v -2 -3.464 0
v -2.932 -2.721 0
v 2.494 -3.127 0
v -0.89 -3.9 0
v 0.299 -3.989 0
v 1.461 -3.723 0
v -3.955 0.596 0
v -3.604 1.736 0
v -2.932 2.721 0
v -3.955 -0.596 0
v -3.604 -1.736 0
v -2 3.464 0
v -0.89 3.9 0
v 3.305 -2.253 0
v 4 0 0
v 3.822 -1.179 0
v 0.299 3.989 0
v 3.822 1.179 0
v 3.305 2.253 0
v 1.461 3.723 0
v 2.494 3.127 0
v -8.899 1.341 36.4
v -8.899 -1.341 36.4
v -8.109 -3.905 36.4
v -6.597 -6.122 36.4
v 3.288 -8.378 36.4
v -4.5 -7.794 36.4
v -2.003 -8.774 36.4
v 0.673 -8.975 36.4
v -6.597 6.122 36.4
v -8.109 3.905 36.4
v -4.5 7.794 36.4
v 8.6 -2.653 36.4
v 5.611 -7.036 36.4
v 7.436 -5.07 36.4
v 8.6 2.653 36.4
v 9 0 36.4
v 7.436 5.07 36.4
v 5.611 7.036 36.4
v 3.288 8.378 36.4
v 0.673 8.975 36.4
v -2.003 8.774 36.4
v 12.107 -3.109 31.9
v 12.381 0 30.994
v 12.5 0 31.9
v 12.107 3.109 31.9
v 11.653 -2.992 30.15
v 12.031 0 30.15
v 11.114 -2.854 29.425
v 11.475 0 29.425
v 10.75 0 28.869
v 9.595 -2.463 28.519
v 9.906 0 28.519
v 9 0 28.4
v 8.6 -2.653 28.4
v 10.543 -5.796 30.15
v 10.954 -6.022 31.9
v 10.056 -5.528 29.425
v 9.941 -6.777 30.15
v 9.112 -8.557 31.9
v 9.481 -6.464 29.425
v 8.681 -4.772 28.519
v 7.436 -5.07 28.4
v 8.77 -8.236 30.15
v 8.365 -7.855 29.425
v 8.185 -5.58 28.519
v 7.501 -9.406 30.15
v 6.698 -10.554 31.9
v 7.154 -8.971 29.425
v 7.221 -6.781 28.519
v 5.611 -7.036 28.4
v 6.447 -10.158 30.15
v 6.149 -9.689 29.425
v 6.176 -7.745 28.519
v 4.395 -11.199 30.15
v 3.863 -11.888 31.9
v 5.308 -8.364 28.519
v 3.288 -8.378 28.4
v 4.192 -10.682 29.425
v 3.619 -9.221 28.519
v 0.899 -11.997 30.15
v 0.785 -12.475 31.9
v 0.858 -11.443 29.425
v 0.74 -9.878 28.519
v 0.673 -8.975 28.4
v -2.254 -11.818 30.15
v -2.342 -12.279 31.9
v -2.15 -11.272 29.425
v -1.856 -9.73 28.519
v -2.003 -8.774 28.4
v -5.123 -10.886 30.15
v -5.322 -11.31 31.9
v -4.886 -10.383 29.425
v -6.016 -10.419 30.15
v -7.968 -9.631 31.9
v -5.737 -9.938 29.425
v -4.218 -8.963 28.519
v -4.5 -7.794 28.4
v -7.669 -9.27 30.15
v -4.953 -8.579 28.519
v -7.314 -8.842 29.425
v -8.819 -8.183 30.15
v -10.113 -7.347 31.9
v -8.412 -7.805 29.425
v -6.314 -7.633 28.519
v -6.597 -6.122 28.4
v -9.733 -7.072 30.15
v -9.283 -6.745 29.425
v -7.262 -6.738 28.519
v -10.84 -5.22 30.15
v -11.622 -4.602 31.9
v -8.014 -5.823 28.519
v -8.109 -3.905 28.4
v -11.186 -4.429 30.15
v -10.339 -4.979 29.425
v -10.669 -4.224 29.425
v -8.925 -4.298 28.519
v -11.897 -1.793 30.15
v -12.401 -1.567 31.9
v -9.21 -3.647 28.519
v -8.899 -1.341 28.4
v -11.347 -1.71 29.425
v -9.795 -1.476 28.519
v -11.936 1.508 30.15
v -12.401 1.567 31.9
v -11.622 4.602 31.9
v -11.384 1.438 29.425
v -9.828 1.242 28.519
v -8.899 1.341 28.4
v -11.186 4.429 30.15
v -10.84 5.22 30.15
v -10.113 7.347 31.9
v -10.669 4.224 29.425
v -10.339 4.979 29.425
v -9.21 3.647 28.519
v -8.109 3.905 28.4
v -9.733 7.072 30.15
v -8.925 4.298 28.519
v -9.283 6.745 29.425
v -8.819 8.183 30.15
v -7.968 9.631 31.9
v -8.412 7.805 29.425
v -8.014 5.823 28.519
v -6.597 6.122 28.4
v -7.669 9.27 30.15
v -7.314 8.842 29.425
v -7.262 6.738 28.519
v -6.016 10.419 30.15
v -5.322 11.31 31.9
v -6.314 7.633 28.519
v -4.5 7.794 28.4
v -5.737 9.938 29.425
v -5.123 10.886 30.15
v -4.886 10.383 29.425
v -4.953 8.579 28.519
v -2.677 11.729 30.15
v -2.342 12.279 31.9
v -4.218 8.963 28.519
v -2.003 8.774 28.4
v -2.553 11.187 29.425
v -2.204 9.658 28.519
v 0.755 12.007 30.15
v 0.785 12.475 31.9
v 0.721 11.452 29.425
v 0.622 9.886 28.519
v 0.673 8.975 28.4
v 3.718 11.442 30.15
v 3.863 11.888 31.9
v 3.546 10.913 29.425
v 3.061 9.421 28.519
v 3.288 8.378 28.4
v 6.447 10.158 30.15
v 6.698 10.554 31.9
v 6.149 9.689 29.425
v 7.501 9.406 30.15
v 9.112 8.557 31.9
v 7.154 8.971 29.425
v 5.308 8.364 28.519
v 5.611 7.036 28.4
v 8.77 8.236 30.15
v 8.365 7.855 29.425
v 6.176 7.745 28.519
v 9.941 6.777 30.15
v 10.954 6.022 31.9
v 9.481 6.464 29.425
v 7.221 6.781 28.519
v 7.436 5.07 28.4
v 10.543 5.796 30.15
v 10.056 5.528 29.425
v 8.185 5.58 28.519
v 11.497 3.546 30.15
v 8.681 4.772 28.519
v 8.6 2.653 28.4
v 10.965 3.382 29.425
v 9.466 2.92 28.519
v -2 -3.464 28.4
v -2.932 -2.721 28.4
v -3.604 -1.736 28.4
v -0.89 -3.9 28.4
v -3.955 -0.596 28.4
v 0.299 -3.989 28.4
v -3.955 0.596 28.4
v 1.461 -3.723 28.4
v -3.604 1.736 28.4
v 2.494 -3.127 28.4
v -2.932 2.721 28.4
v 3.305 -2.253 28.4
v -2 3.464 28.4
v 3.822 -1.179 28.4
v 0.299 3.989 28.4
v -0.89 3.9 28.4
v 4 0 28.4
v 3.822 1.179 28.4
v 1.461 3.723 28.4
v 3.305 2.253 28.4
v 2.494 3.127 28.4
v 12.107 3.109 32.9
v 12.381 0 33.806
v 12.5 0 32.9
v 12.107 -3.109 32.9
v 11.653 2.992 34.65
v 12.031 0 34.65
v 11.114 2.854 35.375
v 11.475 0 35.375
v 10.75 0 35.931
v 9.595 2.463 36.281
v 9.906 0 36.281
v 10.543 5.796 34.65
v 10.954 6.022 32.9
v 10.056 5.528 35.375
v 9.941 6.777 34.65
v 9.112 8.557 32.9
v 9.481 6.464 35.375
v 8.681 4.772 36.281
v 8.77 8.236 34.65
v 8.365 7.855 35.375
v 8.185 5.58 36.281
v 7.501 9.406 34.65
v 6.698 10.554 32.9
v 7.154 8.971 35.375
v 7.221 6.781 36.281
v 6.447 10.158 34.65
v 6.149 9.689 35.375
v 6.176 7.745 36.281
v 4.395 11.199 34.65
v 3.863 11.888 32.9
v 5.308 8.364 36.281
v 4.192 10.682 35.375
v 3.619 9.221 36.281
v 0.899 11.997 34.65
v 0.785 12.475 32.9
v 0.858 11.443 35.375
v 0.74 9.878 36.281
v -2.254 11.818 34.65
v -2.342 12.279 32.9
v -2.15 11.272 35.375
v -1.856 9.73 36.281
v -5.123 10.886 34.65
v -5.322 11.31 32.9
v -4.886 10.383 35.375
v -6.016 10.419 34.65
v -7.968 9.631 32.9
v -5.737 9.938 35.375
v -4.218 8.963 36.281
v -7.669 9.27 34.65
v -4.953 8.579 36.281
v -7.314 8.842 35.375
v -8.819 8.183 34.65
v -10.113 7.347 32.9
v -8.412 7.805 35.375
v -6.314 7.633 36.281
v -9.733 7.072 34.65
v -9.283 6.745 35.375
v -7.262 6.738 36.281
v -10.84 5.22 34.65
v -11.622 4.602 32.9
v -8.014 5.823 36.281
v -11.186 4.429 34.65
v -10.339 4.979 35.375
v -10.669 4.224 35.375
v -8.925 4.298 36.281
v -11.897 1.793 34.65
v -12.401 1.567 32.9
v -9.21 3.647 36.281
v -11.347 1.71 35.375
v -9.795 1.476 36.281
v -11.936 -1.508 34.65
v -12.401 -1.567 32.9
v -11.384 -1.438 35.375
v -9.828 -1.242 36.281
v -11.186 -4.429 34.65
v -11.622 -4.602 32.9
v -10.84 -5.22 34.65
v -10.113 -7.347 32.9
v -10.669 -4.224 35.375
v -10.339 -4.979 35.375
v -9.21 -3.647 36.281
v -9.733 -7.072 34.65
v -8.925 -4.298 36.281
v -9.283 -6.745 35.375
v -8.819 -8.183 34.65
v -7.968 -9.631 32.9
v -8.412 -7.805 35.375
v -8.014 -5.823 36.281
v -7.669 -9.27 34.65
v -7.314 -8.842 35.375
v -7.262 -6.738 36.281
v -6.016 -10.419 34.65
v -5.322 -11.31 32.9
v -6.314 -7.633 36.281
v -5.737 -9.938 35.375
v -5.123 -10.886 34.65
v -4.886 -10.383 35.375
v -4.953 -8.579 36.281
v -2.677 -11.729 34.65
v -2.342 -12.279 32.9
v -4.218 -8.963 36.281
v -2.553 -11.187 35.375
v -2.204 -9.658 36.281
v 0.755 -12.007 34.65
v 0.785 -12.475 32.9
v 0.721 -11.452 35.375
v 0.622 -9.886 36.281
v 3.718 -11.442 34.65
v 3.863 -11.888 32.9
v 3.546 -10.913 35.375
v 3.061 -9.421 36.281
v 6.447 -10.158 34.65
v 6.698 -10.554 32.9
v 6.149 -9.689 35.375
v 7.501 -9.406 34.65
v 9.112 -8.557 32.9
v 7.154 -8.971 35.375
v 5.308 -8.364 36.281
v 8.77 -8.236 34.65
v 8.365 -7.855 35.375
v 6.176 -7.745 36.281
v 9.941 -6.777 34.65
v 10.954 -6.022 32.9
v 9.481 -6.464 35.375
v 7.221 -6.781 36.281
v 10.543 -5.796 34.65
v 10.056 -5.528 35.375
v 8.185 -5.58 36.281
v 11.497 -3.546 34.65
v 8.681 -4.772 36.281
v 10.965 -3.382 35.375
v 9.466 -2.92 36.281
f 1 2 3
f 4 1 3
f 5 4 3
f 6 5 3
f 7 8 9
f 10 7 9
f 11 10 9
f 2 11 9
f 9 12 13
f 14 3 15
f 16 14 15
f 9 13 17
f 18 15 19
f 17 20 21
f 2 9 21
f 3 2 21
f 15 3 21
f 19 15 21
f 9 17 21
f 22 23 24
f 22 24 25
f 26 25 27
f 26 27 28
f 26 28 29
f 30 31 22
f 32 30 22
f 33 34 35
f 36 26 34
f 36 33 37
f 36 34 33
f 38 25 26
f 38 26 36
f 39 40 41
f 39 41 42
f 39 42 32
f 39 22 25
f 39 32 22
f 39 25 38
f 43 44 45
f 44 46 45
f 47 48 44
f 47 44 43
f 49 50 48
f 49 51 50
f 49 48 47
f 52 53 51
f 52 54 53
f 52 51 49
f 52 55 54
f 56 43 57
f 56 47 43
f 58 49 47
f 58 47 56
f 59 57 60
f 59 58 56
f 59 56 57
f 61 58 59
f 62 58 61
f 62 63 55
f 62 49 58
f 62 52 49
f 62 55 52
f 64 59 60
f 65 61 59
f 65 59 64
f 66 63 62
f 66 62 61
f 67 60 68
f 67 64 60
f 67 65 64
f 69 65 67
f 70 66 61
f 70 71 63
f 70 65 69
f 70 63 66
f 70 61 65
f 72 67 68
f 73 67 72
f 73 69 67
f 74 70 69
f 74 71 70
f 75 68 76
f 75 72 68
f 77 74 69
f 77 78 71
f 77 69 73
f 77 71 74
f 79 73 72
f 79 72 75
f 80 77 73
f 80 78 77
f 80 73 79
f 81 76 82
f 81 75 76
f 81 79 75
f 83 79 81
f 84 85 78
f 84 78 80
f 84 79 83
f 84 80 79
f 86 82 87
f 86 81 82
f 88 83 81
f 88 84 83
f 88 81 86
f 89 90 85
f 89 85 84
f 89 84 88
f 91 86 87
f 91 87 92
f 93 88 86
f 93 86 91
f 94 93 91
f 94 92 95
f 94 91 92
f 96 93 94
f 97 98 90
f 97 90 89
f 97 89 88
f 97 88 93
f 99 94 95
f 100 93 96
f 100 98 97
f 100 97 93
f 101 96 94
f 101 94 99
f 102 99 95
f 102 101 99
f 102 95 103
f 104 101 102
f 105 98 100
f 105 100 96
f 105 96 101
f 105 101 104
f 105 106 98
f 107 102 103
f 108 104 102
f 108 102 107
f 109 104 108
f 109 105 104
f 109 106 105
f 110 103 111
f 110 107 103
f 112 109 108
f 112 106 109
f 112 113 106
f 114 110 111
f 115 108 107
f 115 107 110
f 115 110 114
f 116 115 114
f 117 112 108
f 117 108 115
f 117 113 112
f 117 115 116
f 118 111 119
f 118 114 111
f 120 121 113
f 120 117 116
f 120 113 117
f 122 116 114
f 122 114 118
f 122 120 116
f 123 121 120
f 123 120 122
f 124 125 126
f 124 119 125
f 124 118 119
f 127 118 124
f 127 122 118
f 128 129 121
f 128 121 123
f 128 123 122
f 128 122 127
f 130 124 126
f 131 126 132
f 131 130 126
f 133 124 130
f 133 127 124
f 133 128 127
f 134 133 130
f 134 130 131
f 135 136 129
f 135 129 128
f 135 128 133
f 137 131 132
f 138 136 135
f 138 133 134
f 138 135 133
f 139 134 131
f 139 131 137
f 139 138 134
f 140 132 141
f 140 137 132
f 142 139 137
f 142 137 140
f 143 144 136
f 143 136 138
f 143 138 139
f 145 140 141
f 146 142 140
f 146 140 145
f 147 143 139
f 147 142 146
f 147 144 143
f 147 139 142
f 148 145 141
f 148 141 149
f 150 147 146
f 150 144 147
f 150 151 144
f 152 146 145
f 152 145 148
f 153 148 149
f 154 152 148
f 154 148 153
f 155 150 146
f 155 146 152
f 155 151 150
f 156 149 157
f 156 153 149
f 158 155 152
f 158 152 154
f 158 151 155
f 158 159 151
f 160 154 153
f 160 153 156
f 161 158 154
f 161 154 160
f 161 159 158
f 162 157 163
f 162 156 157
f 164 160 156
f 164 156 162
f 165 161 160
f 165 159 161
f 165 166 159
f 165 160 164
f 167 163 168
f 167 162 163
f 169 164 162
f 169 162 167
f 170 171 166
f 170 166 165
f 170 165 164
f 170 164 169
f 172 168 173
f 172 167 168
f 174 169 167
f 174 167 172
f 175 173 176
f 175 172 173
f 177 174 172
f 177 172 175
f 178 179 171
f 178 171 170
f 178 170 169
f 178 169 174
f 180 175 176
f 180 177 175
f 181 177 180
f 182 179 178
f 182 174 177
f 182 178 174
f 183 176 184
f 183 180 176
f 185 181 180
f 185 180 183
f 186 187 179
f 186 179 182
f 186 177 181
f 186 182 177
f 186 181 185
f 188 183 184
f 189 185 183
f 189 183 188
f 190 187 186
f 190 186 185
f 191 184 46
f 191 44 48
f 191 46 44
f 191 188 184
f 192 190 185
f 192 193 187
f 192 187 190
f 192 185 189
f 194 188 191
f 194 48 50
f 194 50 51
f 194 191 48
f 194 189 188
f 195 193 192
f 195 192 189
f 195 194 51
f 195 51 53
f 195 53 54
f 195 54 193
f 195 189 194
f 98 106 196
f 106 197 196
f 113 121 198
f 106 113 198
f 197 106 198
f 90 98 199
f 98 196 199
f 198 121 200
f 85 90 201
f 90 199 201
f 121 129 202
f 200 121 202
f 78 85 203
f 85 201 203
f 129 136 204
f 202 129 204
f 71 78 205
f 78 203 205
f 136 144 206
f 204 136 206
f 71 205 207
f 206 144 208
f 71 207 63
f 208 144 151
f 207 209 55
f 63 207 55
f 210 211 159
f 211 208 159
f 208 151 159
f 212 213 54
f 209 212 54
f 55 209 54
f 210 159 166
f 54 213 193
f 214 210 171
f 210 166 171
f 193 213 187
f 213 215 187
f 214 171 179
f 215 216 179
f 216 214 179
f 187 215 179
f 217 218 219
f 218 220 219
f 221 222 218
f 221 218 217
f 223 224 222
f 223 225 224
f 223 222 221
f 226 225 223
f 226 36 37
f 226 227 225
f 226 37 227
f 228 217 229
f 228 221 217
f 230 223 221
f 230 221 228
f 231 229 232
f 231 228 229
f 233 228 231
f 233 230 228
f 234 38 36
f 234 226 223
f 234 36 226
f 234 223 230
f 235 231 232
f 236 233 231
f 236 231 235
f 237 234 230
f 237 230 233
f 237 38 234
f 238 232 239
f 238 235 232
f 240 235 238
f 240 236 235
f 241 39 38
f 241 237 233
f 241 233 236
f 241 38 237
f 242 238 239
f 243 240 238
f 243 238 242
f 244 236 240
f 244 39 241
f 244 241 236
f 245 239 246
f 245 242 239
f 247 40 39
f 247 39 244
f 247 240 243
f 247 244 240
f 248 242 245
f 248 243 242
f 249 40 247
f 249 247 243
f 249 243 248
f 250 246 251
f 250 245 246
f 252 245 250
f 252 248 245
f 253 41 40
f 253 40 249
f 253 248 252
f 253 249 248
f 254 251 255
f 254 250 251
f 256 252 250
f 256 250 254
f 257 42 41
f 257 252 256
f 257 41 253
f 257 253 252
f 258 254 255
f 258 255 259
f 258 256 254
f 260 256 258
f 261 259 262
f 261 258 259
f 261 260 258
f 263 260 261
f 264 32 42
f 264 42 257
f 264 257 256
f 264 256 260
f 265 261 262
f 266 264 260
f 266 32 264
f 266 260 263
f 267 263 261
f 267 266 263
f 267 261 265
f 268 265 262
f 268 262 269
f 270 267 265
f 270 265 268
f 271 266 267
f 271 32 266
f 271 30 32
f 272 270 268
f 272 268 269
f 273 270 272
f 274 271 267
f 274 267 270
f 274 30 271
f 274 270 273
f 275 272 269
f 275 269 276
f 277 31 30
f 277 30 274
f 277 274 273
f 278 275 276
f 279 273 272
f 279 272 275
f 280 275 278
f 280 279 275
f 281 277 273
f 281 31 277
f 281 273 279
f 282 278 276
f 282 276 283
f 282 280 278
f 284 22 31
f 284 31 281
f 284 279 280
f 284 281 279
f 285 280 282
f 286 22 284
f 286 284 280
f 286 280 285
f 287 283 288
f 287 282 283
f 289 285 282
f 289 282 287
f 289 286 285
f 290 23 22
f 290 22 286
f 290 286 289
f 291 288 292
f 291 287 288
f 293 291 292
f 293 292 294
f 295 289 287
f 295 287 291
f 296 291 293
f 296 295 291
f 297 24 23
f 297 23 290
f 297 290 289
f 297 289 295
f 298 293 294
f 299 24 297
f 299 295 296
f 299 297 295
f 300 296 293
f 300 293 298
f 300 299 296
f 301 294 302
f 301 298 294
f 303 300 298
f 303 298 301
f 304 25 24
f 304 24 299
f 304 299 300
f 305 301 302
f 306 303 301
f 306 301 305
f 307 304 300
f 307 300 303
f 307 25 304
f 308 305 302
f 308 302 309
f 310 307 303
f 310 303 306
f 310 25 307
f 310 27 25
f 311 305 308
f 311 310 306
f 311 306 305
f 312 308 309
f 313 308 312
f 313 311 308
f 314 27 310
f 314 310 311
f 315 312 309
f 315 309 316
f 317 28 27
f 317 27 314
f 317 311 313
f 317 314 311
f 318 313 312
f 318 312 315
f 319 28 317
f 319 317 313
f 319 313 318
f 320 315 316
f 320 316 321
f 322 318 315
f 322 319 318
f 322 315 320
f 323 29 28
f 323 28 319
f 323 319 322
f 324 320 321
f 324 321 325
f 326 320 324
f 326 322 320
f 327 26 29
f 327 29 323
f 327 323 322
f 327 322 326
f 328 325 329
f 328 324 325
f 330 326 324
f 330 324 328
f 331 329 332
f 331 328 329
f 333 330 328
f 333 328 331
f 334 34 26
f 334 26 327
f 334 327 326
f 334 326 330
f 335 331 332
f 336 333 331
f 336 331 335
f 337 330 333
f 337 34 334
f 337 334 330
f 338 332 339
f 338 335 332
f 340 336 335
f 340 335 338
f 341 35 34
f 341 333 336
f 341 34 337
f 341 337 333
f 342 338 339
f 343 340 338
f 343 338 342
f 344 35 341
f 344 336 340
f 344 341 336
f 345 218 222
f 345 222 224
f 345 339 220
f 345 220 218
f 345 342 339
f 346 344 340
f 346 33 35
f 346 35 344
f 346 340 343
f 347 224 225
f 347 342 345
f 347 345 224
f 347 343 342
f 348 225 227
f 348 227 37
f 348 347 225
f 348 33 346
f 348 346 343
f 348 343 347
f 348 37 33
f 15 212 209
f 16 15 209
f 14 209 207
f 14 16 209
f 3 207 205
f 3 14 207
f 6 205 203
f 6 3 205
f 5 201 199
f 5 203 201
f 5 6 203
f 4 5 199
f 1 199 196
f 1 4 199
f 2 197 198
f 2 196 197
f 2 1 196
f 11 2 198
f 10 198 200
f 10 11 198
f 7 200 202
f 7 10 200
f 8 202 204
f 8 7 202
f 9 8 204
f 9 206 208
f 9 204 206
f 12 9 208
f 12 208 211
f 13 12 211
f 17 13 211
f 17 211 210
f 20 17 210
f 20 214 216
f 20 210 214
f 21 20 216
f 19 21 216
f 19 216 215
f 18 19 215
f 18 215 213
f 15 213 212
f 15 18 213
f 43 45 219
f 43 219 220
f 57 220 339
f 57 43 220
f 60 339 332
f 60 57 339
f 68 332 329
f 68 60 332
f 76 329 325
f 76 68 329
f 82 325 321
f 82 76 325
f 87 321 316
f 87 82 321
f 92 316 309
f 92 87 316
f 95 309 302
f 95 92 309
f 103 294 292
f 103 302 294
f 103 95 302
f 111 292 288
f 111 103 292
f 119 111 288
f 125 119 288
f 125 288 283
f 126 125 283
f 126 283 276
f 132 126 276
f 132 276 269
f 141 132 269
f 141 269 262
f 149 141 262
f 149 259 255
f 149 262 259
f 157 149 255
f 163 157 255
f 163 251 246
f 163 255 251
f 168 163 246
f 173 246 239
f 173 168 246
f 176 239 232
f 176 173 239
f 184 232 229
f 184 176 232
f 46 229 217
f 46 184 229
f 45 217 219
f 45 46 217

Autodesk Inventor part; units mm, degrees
ref_plane "YZ Plane" through (0, 0, 0) normal (1, 0, 0) x (0, 1, 0)
ref_plane "XZ Plane" through (0, 0, 0) normal (0, 1, 0) x (-1, 0, 0)
ref_plane "XY Plane" through (0, 0, 0) normal (0, 0, 1) x (1, 0, 0)
sketch "Sketch1" plane through (0, 0, 0) normal (0, 0, 1) x (1, 0, 0)
  circle A0 centre (0, 0) radius 4
  dimension "d0" = 8
extrude "Extrusion1" add sketch "Sketch1" along normal blind 28.4
sketch "Sketch2" plane through (0, 0, 28.4) normal (0, 0, 1) x (1, 0, 0)
  circle A0 centre (0, 0) radius 12.5
  dimension "d3" = 25
extrude "Extrusion2" add sketch "Sketch2" along normal blind 8
fillet "Fillet1" radius 3.5 1 edges at (-12.5, 0, 36.4)
fillet "Fillet2" radius 3.5 1 edges at (-12.5, 0, 28.4)
properties part number "Wheel"
